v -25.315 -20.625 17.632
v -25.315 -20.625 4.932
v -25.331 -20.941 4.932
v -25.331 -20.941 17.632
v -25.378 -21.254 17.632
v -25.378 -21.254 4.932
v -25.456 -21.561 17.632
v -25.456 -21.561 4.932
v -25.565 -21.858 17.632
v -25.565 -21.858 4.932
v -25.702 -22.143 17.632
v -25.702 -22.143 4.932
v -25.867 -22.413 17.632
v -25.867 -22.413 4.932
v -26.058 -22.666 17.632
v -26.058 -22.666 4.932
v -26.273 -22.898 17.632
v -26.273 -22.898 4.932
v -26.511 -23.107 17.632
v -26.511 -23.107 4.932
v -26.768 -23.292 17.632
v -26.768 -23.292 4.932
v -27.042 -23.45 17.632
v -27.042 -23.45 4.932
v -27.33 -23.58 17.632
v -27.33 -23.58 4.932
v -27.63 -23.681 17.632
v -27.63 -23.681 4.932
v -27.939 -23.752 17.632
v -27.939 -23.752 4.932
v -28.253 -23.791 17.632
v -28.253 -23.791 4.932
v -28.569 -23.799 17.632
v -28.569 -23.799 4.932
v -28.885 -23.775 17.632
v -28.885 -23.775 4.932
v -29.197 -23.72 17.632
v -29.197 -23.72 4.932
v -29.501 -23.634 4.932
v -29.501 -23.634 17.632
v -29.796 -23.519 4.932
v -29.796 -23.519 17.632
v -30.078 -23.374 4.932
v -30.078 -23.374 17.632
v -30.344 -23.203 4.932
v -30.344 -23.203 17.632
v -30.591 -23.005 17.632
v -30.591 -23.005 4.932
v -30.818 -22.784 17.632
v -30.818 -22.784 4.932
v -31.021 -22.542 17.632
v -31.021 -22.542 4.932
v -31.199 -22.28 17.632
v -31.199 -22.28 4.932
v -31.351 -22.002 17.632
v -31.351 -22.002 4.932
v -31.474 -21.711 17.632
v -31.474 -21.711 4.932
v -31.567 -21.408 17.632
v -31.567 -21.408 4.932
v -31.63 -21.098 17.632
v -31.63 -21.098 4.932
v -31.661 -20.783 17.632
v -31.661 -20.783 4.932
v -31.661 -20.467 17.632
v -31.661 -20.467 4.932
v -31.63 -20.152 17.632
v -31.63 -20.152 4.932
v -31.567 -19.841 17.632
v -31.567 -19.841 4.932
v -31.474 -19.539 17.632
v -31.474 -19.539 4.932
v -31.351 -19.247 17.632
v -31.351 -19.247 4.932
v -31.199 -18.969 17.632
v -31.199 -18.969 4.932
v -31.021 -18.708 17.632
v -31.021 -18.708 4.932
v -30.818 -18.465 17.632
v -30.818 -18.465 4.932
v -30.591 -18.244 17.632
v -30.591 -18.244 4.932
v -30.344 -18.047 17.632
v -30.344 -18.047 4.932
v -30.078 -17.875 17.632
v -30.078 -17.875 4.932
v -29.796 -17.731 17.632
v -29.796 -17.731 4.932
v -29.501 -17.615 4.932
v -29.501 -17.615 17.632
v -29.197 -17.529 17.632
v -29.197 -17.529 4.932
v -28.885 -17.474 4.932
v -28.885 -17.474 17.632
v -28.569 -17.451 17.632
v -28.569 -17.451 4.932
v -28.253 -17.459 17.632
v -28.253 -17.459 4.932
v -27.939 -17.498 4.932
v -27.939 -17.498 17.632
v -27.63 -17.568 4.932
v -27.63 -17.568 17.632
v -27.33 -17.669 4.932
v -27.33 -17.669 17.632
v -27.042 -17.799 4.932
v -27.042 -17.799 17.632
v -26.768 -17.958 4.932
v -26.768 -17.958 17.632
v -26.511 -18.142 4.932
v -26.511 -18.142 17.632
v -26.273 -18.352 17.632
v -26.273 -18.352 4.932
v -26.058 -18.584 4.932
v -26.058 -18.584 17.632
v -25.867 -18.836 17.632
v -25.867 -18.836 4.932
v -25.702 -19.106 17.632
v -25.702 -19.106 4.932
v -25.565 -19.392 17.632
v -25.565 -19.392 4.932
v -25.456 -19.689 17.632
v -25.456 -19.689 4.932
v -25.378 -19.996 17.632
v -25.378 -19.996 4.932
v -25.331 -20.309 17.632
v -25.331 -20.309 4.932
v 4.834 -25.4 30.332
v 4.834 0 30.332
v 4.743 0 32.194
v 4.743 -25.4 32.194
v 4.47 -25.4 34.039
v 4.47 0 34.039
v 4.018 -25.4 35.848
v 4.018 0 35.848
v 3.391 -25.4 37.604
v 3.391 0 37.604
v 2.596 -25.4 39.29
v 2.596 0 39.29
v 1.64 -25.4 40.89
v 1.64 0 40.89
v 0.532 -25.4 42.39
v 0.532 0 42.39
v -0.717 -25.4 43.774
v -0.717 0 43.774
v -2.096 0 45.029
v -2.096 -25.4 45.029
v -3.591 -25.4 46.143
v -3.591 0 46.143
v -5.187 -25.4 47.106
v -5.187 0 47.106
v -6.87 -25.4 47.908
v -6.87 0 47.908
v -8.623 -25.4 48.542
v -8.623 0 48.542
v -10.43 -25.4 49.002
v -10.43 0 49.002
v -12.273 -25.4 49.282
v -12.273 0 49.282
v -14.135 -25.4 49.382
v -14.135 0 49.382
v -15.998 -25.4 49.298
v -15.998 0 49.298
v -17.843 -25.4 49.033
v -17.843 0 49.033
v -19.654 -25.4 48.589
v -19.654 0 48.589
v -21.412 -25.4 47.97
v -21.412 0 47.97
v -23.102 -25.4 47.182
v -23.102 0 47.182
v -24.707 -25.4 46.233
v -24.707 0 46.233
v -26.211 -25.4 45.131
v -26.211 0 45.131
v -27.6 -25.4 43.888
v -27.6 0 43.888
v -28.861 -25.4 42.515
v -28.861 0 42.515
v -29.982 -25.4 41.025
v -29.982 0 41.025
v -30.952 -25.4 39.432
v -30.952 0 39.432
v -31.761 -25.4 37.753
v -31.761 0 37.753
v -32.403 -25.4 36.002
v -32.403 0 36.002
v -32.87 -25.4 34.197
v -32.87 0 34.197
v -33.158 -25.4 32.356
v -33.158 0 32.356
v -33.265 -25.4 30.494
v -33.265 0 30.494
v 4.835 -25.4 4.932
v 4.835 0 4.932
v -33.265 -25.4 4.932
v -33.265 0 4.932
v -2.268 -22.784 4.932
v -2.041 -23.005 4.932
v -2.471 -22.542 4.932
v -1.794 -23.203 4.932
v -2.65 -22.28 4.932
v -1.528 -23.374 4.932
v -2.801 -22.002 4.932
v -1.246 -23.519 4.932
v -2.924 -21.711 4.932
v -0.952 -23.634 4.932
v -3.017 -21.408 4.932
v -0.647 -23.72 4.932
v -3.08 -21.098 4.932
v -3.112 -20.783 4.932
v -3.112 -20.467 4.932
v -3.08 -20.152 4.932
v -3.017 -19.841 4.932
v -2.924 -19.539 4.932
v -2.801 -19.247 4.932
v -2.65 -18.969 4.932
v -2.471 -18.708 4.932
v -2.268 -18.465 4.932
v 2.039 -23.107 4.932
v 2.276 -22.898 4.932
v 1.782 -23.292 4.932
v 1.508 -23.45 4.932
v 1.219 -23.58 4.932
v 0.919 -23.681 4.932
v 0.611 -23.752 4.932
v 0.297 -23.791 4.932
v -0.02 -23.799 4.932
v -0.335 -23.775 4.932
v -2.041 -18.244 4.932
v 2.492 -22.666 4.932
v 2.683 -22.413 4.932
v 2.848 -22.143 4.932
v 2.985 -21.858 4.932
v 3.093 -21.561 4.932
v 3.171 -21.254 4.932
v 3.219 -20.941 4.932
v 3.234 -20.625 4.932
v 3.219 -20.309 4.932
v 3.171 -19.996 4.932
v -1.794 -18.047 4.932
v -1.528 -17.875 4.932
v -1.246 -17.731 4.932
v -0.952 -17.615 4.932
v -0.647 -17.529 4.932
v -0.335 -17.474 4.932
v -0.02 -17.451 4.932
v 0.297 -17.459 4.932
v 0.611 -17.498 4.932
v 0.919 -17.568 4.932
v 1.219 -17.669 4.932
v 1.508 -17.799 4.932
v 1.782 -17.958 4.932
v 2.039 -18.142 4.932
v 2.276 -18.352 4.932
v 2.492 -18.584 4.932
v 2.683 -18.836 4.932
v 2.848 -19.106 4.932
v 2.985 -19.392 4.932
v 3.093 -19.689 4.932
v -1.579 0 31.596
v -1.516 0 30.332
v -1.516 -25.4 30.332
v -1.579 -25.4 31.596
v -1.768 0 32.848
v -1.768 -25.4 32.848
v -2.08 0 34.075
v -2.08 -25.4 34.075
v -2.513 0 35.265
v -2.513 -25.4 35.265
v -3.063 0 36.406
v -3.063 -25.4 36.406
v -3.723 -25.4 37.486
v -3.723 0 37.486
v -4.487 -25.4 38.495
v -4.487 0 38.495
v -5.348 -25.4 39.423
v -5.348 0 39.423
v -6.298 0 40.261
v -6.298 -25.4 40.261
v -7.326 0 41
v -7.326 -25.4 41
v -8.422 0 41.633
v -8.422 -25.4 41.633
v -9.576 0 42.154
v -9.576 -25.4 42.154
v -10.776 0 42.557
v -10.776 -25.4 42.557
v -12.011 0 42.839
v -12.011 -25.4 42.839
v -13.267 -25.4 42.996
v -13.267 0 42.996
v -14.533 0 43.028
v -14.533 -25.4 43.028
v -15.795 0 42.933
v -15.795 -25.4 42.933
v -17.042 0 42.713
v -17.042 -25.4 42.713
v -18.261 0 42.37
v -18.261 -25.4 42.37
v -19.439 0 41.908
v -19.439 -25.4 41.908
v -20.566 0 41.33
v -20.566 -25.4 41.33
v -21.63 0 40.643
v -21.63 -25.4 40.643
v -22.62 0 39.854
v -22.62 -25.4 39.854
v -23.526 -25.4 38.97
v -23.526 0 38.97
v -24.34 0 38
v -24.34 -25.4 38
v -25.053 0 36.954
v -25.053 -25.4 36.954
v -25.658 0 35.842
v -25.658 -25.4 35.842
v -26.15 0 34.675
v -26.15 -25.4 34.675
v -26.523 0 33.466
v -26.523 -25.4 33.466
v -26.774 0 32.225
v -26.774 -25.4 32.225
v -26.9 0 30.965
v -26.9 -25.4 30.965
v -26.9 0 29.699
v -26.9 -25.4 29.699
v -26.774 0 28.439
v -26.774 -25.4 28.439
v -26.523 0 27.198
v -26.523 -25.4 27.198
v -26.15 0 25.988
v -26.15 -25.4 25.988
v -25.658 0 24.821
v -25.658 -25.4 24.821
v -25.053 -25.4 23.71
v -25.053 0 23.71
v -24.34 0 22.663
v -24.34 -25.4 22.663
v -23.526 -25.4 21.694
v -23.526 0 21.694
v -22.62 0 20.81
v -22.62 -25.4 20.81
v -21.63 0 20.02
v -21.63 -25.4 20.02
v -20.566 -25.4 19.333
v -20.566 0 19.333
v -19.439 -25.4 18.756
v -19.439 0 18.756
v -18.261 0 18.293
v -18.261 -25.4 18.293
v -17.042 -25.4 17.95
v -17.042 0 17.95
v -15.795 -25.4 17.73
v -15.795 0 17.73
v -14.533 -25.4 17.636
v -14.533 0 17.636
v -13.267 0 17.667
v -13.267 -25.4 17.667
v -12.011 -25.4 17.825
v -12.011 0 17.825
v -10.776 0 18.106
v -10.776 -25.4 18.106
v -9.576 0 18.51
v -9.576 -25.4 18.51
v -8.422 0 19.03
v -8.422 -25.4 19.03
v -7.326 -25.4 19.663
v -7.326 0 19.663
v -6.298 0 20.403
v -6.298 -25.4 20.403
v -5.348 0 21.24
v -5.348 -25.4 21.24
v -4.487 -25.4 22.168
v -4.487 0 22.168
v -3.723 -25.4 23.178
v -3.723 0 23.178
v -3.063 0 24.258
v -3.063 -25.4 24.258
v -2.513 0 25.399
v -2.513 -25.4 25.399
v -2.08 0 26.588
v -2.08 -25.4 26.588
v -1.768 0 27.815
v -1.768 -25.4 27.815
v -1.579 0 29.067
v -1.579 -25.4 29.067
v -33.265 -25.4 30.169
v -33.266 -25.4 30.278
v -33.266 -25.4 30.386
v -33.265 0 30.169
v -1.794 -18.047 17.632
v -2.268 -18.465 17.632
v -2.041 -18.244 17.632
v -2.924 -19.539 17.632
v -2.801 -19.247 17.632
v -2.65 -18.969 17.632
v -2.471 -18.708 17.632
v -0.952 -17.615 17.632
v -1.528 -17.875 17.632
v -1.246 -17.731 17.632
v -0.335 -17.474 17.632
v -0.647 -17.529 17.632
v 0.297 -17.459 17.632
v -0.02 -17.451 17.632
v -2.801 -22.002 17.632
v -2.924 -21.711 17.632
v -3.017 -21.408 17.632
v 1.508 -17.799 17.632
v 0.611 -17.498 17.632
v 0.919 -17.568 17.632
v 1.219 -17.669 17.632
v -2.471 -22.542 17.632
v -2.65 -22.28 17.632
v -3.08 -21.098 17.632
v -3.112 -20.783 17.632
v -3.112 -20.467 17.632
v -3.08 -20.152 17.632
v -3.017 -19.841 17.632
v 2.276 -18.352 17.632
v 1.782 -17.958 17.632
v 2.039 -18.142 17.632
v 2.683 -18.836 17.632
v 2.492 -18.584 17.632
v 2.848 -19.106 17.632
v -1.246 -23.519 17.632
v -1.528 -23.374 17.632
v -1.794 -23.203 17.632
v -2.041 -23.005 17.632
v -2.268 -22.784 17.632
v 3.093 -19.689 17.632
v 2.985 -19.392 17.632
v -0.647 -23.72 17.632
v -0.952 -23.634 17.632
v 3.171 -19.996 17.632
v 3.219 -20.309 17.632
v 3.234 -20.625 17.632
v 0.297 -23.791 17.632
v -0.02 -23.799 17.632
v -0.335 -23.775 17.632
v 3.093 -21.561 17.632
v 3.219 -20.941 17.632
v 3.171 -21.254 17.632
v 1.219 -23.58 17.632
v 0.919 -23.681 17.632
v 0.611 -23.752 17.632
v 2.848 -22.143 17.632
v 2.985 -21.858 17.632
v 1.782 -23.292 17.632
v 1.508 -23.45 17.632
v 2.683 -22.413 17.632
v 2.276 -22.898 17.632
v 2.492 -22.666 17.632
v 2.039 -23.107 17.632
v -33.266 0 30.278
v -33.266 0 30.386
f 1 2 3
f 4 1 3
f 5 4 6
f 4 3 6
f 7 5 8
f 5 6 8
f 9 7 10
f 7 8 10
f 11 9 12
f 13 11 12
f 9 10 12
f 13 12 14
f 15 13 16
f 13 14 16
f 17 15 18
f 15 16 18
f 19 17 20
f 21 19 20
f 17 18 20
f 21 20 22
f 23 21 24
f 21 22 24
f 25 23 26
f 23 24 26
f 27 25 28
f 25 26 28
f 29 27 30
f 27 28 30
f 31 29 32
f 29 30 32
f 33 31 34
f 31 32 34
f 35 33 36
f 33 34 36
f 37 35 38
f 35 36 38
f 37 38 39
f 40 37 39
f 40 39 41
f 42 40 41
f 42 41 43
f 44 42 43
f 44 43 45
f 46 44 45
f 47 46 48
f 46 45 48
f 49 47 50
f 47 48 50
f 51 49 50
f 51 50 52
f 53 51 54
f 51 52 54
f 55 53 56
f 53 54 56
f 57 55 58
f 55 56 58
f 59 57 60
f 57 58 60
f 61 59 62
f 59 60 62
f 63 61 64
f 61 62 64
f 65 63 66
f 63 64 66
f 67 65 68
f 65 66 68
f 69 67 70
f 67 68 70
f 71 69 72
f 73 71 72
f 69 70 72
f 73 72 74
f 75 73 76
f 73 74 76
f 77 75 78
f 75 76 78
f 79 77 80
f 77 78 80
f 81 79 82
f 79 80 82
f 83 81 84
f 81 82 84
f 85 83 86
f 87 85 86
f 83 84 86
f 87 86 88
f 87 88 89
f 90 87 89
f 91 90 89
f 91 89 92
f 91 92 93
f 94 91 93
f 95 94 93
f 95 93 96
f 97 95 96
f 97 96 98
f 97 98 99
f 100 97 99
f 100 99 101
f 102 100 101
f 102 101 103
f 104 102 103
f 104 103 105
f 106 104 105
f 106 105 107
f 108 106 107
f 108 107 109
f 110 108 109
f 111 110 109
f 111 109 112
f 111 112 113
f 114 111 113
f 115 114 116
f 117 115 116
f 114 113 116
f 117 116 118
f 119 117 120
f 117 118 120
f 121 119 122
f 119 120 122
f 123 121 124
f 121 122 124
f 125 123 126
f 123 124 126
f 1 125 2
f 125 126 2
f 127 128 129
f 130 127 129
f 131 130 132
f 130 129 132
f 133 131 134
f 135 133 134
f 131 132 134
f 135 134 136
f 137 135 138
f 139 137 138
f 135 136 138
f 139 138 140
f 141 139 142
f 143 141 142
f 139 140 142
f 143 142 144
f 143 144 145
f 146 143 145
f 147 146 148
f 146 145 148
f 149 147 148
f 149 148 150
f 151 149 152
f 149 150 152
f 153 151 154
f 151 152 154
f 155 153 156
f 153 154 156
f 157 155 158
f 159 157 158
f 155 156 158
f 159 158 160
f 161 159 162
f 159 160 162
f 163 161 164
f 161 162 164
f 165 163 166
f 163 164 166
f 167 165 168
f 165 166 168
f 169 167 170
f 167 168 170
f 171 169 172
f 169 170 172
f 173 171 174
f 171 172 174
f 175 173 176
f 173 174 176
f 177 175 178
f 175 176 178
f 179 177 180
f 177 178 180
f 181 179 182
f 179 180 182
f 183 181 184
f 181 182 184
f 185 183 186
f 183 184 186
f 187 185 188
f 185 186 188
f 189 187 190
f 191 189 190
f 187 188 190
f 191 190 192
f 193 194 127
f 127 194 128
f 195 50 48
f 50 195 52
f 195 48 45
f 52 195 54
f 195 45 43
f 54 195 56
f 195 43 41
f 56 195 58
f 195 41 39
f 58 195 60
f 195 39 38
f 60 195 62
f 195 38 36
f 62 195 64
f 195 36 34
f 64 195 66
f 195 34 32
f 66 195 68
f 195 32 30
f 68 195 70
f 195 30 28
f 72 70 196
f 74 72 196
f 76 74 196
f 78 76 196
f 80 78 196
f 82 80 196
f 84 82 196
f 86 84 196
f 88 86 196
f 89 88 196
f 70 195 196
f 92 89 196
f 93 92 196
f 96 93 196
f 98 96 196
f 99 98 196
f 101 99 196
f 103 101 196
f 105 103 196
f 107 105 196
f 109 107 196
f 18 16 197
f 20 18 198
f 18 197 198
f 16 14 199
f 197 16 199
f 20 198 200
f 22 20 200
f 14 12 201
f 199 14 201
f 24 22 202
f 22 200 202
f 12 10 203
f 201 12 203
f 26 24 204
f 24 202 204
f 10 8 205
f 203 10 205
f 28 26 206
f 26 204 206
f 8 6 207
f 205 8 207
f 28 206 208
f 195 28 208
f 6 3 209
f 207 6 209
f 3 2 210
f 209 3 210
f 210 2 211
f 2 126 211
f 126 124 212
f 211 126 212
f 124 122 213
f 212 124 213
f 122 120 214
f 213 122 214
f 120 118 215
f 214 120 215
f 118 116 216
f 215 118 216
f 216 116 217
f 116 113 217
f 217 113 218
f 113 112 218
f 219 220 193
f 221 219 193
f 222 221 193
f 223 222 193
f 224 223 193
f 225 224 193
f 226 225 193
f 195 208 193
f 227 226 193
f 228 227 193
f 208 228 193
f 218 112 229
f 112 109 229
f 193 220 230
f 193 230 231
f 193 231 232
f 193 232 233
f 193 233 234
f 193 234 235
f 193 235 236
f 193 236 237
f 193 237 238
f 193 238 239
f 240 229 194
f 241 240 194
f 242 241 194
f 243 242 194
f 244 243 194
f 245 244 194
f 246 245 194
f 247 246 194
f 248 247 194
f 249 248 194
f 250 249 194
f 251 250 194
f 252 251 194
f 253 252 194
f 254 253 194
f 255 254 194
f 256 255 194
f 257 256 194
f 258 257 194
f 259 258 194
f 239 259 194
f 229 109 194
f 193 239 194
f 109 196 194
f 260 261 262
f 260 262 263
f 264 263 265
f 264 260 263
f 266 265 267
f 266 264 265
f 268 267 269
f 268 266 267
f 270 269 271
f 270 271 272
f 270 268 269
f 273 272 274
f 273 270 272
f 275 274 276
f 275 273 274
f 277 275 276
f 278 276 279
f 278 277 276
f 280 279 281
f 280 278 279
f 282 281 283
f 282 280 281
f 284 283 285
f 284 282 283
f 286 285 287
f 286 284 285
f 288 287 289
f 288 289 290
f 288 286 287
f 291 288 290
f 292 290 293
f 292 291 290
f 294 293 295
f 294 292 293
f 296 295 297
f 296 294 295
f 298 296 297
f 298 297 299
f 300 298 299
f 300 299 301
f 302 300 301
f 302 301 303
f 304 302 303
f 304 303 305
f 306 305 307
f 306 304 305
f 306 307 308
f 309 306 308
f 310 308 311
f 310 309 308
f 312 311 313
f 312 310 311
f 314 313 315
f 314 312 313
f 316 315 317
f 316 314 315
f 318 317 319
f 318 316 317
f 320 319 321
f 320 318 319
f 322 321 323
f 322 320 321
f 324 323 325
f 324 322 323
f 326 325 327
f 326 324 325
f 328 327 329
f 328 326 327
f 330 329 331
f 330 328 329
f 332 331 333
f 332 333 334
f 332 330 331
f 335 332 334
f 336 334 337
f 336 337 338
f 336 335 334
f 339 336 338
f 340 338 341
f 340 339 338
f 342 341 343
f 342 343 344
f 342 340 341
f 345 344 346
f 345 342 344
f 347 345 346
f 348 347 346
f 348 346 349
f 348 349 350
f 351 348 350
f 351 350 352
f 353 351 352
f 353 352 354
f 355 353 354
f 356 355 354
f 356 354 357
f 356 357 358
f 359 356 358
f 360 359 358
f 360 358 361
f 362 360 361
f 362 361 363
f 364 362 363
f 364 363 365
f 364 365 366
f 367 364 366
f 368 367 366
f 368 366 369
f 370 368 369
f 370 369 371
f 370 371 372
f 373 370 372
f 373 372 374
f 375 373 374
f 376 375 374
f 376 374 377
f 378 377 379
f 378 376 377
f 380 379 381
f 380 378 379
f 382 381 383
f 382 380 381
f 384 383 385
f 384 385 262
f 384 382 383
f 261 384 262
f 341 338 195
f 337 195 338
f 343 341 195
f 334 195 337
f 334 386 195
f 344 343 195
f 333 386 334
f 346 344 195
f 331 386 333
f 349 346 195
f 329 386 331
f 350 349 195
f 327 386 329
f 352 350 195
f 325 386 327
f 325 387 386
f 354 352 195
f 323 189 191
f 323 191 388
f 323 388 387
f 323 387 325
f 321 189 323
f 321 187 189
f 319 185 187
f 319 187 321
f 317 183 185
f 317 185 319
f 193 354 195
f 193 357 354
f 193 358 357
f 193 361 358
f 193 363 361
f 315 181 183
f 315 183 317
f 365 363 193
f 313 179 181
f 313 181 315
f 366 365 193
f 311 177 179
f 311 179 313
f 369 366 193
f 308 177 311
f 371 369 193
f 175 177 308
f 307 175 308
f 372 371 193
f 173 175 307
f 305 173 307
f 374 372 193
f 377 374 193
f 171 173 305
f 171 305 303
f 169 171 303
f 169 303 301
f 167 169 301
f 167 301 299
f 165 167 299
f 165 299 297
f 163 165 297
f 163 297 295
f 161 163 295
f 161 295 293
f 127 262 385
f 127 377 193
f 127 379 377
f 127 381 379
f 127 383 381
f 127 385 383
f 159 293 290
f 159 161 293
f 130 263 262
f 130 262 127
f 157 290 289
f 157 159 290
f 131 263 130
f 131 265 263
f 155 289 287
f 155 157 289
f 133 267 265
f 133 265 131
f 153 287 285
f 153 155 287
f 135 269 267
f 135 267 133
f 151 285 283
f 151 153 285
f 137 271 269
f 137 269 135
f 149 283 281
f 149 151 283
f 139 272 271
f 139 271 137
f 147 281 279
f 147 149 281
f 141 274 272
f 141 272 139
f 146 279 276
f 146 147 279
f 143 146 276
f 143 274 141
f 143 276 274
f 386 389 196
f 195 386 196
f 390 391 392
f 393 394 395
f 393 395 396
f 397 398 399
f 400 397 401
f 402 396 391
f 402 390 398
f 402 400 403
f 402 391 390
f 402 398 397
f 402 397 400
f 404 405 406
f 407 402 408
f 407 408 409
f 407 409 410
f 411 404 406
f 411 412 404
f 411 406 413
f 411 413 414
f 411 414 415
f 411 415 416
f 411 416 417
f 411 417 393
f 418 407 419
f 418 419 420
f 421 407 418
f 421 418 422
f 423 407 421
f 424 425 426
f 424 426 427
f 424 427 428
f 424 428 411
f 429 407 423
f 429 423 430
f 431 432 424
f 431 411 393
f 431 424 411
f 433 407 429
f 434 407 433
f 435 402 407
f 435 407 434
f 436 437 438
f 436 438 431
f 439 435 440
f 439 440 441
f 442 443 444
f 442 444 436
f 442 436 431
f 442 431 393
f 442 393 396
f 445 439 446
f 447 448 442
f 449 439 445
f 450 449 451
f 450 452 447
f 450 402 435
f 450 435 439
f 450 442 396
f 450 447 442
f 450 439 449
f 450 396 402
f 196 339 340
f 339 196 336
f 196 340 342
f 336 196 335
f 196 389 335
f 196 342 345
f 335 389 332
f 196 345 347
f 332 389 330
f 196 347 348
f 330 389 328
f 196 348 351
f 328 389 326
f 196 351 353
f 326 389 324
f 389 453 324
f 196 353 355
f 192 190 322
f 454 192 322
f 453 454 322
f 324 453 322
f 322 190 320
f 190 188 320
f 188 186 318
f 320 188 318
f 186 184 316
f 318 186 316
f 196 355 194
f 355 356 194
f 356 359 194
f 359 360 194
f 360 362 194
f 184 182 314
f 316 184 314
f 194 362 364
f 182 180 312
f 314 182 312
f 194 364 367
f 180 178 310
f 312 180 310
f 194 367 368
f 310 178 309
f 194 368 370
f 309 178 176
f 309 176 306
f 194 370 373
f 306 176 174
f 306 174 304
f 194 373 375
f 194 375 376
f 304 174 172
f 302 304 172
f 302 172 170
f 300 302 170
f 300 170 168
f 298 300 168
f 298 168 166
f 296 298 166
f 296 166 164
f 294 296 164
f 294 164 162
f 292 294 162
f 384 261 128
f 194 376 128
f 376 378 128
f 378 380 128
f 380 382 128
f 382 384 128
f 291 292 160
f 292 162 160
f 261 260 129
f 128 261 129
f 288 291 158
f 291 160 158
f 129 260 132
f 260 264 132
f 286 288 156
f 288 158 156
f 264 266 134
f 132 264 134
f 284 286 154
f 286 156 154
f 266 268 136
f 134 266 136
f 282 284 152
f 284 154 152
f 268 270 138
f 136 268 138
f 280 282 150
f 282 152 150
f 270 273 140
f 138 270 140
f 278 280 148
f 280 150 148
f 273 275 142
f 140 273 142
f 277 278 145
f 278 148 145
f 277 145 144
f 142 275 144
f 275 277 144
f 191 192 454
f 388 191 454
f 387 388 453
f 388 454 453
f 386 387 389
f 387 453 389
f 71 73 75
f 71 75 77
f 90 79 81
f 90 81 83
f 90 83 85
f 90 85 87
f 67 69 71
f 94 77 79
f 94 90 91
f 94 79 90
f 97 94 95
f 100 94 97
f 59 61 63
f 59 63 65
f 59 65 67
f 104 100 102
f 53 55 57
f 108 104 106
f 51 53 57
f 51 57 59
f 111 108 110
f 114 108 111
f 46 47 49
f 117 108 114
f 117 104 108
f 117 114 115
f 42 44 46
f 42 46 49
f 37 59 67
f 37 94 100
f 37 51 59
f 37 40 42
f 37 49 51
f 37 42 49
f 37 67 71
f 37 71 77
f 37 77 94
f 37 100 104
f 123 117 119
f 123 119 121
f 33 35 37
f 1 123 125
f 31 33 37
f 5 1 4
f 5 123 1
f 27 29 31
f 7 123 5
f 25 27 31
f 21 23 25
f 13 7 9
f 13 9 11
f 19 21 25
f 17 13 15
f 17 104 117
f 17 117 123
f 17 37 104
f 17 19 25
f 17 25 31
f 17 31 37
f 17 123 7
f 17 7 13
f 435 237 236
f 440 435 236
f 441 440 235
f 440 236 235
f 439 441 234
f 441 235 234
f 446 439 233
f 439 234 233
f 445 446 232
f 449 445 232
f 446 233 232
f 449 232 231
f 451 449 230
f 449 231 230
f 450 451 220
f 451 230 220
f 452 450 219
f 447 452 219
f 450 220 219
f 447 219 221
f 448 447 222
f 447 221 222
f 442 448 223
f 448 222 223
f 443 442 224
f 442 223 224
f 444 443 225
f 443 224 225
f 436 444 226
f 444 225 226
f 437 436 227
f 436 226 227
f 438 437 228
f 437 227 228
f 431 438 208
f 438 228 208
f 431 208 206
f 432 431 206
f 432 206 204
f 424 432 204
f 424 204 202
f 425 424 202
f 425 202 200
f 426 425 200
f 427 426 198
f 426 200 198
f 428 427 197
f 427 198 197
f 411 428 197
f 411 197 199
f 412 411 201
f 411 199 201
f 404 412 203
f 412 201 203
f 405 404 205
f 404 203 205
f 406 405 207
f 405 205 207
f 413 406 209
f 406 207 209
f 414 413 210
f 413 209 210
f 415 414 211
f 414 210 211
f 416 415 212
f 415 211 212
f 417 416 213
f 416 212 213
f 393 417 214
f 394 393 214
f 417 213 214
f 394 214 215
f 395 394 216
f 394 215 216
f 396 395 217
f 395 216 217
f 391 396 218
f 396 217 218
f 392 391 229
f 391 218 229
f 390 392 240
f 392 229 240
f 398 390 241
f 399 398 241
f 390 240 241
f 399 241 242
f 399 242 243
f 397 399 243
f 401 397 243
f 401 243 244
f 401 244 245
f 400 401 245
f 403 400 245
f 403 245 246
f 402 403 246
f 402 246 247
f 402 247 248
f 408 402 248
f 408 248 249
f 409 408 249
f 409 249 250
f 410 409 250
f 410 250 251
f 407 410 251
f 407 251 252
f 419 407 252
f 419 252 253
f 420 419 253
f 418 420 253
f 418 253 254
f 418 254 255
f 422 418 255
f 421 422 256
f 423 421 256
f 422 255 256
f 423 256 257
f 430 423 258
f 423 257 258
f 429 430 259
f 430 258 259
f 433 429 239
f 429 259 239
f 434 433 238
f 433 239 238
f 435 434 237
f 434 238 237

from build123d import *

# Parameters (mm, degrees)
F0_R     = 12.7
F1_DEPTH = 25.4
F2_R     = 3.175
F3_DEPTH = 12.7


with BuildPart() as f1:
    # F0 (on Front) → F1 (new body)
    with BuildSketch(Plane.XZ):
        with BuildLine():
            Line((4.8346, 4.932279), (4.833907, 30.332279))
            ThreePointArc((4.833907, 30.332279), (-14.135108, 49.381587), (-33.2654, 30.494248))
            Line((-33.2654, 30.494248), (-33.2654, 30.169272))
            Line((-33.2654, 30.169272), (-33.2654, 4.932279))
            Line((-33.2654, 4.932279), (4.8346, 4.932279))
        make_face()
        with Locations((-14.216093, 30.33176)):
            Circle(F0_R, mode=Mode.SUBTRACT)
        with BuildLine():
            Line((-33.2654, 30.169272), (-33.2654, 30.494248))
            ThreePointArc((-33.2654, 30.494248), (-33.266093, 30.33176), (-33.2654, 30.169272))
        make_face()
    extrude(amount=F1_DEPTH)

    # F2 (on face) → F3 (cut)
    with BuildSketch(Plane(origin=(0, 0, 4.932279), x_dir=(1, 0, 0), z_dir=(0, 0, -1))):
        with Locations((-28.4902, 20.6248)):
            Circle(F2_R)
        with Locations((0.0594, 20.6248)):
            Circle(F2_R)
    extrude(amount=-F3_DEPTH, mode=Mode.SUBTRACT)


solid = f1.part
